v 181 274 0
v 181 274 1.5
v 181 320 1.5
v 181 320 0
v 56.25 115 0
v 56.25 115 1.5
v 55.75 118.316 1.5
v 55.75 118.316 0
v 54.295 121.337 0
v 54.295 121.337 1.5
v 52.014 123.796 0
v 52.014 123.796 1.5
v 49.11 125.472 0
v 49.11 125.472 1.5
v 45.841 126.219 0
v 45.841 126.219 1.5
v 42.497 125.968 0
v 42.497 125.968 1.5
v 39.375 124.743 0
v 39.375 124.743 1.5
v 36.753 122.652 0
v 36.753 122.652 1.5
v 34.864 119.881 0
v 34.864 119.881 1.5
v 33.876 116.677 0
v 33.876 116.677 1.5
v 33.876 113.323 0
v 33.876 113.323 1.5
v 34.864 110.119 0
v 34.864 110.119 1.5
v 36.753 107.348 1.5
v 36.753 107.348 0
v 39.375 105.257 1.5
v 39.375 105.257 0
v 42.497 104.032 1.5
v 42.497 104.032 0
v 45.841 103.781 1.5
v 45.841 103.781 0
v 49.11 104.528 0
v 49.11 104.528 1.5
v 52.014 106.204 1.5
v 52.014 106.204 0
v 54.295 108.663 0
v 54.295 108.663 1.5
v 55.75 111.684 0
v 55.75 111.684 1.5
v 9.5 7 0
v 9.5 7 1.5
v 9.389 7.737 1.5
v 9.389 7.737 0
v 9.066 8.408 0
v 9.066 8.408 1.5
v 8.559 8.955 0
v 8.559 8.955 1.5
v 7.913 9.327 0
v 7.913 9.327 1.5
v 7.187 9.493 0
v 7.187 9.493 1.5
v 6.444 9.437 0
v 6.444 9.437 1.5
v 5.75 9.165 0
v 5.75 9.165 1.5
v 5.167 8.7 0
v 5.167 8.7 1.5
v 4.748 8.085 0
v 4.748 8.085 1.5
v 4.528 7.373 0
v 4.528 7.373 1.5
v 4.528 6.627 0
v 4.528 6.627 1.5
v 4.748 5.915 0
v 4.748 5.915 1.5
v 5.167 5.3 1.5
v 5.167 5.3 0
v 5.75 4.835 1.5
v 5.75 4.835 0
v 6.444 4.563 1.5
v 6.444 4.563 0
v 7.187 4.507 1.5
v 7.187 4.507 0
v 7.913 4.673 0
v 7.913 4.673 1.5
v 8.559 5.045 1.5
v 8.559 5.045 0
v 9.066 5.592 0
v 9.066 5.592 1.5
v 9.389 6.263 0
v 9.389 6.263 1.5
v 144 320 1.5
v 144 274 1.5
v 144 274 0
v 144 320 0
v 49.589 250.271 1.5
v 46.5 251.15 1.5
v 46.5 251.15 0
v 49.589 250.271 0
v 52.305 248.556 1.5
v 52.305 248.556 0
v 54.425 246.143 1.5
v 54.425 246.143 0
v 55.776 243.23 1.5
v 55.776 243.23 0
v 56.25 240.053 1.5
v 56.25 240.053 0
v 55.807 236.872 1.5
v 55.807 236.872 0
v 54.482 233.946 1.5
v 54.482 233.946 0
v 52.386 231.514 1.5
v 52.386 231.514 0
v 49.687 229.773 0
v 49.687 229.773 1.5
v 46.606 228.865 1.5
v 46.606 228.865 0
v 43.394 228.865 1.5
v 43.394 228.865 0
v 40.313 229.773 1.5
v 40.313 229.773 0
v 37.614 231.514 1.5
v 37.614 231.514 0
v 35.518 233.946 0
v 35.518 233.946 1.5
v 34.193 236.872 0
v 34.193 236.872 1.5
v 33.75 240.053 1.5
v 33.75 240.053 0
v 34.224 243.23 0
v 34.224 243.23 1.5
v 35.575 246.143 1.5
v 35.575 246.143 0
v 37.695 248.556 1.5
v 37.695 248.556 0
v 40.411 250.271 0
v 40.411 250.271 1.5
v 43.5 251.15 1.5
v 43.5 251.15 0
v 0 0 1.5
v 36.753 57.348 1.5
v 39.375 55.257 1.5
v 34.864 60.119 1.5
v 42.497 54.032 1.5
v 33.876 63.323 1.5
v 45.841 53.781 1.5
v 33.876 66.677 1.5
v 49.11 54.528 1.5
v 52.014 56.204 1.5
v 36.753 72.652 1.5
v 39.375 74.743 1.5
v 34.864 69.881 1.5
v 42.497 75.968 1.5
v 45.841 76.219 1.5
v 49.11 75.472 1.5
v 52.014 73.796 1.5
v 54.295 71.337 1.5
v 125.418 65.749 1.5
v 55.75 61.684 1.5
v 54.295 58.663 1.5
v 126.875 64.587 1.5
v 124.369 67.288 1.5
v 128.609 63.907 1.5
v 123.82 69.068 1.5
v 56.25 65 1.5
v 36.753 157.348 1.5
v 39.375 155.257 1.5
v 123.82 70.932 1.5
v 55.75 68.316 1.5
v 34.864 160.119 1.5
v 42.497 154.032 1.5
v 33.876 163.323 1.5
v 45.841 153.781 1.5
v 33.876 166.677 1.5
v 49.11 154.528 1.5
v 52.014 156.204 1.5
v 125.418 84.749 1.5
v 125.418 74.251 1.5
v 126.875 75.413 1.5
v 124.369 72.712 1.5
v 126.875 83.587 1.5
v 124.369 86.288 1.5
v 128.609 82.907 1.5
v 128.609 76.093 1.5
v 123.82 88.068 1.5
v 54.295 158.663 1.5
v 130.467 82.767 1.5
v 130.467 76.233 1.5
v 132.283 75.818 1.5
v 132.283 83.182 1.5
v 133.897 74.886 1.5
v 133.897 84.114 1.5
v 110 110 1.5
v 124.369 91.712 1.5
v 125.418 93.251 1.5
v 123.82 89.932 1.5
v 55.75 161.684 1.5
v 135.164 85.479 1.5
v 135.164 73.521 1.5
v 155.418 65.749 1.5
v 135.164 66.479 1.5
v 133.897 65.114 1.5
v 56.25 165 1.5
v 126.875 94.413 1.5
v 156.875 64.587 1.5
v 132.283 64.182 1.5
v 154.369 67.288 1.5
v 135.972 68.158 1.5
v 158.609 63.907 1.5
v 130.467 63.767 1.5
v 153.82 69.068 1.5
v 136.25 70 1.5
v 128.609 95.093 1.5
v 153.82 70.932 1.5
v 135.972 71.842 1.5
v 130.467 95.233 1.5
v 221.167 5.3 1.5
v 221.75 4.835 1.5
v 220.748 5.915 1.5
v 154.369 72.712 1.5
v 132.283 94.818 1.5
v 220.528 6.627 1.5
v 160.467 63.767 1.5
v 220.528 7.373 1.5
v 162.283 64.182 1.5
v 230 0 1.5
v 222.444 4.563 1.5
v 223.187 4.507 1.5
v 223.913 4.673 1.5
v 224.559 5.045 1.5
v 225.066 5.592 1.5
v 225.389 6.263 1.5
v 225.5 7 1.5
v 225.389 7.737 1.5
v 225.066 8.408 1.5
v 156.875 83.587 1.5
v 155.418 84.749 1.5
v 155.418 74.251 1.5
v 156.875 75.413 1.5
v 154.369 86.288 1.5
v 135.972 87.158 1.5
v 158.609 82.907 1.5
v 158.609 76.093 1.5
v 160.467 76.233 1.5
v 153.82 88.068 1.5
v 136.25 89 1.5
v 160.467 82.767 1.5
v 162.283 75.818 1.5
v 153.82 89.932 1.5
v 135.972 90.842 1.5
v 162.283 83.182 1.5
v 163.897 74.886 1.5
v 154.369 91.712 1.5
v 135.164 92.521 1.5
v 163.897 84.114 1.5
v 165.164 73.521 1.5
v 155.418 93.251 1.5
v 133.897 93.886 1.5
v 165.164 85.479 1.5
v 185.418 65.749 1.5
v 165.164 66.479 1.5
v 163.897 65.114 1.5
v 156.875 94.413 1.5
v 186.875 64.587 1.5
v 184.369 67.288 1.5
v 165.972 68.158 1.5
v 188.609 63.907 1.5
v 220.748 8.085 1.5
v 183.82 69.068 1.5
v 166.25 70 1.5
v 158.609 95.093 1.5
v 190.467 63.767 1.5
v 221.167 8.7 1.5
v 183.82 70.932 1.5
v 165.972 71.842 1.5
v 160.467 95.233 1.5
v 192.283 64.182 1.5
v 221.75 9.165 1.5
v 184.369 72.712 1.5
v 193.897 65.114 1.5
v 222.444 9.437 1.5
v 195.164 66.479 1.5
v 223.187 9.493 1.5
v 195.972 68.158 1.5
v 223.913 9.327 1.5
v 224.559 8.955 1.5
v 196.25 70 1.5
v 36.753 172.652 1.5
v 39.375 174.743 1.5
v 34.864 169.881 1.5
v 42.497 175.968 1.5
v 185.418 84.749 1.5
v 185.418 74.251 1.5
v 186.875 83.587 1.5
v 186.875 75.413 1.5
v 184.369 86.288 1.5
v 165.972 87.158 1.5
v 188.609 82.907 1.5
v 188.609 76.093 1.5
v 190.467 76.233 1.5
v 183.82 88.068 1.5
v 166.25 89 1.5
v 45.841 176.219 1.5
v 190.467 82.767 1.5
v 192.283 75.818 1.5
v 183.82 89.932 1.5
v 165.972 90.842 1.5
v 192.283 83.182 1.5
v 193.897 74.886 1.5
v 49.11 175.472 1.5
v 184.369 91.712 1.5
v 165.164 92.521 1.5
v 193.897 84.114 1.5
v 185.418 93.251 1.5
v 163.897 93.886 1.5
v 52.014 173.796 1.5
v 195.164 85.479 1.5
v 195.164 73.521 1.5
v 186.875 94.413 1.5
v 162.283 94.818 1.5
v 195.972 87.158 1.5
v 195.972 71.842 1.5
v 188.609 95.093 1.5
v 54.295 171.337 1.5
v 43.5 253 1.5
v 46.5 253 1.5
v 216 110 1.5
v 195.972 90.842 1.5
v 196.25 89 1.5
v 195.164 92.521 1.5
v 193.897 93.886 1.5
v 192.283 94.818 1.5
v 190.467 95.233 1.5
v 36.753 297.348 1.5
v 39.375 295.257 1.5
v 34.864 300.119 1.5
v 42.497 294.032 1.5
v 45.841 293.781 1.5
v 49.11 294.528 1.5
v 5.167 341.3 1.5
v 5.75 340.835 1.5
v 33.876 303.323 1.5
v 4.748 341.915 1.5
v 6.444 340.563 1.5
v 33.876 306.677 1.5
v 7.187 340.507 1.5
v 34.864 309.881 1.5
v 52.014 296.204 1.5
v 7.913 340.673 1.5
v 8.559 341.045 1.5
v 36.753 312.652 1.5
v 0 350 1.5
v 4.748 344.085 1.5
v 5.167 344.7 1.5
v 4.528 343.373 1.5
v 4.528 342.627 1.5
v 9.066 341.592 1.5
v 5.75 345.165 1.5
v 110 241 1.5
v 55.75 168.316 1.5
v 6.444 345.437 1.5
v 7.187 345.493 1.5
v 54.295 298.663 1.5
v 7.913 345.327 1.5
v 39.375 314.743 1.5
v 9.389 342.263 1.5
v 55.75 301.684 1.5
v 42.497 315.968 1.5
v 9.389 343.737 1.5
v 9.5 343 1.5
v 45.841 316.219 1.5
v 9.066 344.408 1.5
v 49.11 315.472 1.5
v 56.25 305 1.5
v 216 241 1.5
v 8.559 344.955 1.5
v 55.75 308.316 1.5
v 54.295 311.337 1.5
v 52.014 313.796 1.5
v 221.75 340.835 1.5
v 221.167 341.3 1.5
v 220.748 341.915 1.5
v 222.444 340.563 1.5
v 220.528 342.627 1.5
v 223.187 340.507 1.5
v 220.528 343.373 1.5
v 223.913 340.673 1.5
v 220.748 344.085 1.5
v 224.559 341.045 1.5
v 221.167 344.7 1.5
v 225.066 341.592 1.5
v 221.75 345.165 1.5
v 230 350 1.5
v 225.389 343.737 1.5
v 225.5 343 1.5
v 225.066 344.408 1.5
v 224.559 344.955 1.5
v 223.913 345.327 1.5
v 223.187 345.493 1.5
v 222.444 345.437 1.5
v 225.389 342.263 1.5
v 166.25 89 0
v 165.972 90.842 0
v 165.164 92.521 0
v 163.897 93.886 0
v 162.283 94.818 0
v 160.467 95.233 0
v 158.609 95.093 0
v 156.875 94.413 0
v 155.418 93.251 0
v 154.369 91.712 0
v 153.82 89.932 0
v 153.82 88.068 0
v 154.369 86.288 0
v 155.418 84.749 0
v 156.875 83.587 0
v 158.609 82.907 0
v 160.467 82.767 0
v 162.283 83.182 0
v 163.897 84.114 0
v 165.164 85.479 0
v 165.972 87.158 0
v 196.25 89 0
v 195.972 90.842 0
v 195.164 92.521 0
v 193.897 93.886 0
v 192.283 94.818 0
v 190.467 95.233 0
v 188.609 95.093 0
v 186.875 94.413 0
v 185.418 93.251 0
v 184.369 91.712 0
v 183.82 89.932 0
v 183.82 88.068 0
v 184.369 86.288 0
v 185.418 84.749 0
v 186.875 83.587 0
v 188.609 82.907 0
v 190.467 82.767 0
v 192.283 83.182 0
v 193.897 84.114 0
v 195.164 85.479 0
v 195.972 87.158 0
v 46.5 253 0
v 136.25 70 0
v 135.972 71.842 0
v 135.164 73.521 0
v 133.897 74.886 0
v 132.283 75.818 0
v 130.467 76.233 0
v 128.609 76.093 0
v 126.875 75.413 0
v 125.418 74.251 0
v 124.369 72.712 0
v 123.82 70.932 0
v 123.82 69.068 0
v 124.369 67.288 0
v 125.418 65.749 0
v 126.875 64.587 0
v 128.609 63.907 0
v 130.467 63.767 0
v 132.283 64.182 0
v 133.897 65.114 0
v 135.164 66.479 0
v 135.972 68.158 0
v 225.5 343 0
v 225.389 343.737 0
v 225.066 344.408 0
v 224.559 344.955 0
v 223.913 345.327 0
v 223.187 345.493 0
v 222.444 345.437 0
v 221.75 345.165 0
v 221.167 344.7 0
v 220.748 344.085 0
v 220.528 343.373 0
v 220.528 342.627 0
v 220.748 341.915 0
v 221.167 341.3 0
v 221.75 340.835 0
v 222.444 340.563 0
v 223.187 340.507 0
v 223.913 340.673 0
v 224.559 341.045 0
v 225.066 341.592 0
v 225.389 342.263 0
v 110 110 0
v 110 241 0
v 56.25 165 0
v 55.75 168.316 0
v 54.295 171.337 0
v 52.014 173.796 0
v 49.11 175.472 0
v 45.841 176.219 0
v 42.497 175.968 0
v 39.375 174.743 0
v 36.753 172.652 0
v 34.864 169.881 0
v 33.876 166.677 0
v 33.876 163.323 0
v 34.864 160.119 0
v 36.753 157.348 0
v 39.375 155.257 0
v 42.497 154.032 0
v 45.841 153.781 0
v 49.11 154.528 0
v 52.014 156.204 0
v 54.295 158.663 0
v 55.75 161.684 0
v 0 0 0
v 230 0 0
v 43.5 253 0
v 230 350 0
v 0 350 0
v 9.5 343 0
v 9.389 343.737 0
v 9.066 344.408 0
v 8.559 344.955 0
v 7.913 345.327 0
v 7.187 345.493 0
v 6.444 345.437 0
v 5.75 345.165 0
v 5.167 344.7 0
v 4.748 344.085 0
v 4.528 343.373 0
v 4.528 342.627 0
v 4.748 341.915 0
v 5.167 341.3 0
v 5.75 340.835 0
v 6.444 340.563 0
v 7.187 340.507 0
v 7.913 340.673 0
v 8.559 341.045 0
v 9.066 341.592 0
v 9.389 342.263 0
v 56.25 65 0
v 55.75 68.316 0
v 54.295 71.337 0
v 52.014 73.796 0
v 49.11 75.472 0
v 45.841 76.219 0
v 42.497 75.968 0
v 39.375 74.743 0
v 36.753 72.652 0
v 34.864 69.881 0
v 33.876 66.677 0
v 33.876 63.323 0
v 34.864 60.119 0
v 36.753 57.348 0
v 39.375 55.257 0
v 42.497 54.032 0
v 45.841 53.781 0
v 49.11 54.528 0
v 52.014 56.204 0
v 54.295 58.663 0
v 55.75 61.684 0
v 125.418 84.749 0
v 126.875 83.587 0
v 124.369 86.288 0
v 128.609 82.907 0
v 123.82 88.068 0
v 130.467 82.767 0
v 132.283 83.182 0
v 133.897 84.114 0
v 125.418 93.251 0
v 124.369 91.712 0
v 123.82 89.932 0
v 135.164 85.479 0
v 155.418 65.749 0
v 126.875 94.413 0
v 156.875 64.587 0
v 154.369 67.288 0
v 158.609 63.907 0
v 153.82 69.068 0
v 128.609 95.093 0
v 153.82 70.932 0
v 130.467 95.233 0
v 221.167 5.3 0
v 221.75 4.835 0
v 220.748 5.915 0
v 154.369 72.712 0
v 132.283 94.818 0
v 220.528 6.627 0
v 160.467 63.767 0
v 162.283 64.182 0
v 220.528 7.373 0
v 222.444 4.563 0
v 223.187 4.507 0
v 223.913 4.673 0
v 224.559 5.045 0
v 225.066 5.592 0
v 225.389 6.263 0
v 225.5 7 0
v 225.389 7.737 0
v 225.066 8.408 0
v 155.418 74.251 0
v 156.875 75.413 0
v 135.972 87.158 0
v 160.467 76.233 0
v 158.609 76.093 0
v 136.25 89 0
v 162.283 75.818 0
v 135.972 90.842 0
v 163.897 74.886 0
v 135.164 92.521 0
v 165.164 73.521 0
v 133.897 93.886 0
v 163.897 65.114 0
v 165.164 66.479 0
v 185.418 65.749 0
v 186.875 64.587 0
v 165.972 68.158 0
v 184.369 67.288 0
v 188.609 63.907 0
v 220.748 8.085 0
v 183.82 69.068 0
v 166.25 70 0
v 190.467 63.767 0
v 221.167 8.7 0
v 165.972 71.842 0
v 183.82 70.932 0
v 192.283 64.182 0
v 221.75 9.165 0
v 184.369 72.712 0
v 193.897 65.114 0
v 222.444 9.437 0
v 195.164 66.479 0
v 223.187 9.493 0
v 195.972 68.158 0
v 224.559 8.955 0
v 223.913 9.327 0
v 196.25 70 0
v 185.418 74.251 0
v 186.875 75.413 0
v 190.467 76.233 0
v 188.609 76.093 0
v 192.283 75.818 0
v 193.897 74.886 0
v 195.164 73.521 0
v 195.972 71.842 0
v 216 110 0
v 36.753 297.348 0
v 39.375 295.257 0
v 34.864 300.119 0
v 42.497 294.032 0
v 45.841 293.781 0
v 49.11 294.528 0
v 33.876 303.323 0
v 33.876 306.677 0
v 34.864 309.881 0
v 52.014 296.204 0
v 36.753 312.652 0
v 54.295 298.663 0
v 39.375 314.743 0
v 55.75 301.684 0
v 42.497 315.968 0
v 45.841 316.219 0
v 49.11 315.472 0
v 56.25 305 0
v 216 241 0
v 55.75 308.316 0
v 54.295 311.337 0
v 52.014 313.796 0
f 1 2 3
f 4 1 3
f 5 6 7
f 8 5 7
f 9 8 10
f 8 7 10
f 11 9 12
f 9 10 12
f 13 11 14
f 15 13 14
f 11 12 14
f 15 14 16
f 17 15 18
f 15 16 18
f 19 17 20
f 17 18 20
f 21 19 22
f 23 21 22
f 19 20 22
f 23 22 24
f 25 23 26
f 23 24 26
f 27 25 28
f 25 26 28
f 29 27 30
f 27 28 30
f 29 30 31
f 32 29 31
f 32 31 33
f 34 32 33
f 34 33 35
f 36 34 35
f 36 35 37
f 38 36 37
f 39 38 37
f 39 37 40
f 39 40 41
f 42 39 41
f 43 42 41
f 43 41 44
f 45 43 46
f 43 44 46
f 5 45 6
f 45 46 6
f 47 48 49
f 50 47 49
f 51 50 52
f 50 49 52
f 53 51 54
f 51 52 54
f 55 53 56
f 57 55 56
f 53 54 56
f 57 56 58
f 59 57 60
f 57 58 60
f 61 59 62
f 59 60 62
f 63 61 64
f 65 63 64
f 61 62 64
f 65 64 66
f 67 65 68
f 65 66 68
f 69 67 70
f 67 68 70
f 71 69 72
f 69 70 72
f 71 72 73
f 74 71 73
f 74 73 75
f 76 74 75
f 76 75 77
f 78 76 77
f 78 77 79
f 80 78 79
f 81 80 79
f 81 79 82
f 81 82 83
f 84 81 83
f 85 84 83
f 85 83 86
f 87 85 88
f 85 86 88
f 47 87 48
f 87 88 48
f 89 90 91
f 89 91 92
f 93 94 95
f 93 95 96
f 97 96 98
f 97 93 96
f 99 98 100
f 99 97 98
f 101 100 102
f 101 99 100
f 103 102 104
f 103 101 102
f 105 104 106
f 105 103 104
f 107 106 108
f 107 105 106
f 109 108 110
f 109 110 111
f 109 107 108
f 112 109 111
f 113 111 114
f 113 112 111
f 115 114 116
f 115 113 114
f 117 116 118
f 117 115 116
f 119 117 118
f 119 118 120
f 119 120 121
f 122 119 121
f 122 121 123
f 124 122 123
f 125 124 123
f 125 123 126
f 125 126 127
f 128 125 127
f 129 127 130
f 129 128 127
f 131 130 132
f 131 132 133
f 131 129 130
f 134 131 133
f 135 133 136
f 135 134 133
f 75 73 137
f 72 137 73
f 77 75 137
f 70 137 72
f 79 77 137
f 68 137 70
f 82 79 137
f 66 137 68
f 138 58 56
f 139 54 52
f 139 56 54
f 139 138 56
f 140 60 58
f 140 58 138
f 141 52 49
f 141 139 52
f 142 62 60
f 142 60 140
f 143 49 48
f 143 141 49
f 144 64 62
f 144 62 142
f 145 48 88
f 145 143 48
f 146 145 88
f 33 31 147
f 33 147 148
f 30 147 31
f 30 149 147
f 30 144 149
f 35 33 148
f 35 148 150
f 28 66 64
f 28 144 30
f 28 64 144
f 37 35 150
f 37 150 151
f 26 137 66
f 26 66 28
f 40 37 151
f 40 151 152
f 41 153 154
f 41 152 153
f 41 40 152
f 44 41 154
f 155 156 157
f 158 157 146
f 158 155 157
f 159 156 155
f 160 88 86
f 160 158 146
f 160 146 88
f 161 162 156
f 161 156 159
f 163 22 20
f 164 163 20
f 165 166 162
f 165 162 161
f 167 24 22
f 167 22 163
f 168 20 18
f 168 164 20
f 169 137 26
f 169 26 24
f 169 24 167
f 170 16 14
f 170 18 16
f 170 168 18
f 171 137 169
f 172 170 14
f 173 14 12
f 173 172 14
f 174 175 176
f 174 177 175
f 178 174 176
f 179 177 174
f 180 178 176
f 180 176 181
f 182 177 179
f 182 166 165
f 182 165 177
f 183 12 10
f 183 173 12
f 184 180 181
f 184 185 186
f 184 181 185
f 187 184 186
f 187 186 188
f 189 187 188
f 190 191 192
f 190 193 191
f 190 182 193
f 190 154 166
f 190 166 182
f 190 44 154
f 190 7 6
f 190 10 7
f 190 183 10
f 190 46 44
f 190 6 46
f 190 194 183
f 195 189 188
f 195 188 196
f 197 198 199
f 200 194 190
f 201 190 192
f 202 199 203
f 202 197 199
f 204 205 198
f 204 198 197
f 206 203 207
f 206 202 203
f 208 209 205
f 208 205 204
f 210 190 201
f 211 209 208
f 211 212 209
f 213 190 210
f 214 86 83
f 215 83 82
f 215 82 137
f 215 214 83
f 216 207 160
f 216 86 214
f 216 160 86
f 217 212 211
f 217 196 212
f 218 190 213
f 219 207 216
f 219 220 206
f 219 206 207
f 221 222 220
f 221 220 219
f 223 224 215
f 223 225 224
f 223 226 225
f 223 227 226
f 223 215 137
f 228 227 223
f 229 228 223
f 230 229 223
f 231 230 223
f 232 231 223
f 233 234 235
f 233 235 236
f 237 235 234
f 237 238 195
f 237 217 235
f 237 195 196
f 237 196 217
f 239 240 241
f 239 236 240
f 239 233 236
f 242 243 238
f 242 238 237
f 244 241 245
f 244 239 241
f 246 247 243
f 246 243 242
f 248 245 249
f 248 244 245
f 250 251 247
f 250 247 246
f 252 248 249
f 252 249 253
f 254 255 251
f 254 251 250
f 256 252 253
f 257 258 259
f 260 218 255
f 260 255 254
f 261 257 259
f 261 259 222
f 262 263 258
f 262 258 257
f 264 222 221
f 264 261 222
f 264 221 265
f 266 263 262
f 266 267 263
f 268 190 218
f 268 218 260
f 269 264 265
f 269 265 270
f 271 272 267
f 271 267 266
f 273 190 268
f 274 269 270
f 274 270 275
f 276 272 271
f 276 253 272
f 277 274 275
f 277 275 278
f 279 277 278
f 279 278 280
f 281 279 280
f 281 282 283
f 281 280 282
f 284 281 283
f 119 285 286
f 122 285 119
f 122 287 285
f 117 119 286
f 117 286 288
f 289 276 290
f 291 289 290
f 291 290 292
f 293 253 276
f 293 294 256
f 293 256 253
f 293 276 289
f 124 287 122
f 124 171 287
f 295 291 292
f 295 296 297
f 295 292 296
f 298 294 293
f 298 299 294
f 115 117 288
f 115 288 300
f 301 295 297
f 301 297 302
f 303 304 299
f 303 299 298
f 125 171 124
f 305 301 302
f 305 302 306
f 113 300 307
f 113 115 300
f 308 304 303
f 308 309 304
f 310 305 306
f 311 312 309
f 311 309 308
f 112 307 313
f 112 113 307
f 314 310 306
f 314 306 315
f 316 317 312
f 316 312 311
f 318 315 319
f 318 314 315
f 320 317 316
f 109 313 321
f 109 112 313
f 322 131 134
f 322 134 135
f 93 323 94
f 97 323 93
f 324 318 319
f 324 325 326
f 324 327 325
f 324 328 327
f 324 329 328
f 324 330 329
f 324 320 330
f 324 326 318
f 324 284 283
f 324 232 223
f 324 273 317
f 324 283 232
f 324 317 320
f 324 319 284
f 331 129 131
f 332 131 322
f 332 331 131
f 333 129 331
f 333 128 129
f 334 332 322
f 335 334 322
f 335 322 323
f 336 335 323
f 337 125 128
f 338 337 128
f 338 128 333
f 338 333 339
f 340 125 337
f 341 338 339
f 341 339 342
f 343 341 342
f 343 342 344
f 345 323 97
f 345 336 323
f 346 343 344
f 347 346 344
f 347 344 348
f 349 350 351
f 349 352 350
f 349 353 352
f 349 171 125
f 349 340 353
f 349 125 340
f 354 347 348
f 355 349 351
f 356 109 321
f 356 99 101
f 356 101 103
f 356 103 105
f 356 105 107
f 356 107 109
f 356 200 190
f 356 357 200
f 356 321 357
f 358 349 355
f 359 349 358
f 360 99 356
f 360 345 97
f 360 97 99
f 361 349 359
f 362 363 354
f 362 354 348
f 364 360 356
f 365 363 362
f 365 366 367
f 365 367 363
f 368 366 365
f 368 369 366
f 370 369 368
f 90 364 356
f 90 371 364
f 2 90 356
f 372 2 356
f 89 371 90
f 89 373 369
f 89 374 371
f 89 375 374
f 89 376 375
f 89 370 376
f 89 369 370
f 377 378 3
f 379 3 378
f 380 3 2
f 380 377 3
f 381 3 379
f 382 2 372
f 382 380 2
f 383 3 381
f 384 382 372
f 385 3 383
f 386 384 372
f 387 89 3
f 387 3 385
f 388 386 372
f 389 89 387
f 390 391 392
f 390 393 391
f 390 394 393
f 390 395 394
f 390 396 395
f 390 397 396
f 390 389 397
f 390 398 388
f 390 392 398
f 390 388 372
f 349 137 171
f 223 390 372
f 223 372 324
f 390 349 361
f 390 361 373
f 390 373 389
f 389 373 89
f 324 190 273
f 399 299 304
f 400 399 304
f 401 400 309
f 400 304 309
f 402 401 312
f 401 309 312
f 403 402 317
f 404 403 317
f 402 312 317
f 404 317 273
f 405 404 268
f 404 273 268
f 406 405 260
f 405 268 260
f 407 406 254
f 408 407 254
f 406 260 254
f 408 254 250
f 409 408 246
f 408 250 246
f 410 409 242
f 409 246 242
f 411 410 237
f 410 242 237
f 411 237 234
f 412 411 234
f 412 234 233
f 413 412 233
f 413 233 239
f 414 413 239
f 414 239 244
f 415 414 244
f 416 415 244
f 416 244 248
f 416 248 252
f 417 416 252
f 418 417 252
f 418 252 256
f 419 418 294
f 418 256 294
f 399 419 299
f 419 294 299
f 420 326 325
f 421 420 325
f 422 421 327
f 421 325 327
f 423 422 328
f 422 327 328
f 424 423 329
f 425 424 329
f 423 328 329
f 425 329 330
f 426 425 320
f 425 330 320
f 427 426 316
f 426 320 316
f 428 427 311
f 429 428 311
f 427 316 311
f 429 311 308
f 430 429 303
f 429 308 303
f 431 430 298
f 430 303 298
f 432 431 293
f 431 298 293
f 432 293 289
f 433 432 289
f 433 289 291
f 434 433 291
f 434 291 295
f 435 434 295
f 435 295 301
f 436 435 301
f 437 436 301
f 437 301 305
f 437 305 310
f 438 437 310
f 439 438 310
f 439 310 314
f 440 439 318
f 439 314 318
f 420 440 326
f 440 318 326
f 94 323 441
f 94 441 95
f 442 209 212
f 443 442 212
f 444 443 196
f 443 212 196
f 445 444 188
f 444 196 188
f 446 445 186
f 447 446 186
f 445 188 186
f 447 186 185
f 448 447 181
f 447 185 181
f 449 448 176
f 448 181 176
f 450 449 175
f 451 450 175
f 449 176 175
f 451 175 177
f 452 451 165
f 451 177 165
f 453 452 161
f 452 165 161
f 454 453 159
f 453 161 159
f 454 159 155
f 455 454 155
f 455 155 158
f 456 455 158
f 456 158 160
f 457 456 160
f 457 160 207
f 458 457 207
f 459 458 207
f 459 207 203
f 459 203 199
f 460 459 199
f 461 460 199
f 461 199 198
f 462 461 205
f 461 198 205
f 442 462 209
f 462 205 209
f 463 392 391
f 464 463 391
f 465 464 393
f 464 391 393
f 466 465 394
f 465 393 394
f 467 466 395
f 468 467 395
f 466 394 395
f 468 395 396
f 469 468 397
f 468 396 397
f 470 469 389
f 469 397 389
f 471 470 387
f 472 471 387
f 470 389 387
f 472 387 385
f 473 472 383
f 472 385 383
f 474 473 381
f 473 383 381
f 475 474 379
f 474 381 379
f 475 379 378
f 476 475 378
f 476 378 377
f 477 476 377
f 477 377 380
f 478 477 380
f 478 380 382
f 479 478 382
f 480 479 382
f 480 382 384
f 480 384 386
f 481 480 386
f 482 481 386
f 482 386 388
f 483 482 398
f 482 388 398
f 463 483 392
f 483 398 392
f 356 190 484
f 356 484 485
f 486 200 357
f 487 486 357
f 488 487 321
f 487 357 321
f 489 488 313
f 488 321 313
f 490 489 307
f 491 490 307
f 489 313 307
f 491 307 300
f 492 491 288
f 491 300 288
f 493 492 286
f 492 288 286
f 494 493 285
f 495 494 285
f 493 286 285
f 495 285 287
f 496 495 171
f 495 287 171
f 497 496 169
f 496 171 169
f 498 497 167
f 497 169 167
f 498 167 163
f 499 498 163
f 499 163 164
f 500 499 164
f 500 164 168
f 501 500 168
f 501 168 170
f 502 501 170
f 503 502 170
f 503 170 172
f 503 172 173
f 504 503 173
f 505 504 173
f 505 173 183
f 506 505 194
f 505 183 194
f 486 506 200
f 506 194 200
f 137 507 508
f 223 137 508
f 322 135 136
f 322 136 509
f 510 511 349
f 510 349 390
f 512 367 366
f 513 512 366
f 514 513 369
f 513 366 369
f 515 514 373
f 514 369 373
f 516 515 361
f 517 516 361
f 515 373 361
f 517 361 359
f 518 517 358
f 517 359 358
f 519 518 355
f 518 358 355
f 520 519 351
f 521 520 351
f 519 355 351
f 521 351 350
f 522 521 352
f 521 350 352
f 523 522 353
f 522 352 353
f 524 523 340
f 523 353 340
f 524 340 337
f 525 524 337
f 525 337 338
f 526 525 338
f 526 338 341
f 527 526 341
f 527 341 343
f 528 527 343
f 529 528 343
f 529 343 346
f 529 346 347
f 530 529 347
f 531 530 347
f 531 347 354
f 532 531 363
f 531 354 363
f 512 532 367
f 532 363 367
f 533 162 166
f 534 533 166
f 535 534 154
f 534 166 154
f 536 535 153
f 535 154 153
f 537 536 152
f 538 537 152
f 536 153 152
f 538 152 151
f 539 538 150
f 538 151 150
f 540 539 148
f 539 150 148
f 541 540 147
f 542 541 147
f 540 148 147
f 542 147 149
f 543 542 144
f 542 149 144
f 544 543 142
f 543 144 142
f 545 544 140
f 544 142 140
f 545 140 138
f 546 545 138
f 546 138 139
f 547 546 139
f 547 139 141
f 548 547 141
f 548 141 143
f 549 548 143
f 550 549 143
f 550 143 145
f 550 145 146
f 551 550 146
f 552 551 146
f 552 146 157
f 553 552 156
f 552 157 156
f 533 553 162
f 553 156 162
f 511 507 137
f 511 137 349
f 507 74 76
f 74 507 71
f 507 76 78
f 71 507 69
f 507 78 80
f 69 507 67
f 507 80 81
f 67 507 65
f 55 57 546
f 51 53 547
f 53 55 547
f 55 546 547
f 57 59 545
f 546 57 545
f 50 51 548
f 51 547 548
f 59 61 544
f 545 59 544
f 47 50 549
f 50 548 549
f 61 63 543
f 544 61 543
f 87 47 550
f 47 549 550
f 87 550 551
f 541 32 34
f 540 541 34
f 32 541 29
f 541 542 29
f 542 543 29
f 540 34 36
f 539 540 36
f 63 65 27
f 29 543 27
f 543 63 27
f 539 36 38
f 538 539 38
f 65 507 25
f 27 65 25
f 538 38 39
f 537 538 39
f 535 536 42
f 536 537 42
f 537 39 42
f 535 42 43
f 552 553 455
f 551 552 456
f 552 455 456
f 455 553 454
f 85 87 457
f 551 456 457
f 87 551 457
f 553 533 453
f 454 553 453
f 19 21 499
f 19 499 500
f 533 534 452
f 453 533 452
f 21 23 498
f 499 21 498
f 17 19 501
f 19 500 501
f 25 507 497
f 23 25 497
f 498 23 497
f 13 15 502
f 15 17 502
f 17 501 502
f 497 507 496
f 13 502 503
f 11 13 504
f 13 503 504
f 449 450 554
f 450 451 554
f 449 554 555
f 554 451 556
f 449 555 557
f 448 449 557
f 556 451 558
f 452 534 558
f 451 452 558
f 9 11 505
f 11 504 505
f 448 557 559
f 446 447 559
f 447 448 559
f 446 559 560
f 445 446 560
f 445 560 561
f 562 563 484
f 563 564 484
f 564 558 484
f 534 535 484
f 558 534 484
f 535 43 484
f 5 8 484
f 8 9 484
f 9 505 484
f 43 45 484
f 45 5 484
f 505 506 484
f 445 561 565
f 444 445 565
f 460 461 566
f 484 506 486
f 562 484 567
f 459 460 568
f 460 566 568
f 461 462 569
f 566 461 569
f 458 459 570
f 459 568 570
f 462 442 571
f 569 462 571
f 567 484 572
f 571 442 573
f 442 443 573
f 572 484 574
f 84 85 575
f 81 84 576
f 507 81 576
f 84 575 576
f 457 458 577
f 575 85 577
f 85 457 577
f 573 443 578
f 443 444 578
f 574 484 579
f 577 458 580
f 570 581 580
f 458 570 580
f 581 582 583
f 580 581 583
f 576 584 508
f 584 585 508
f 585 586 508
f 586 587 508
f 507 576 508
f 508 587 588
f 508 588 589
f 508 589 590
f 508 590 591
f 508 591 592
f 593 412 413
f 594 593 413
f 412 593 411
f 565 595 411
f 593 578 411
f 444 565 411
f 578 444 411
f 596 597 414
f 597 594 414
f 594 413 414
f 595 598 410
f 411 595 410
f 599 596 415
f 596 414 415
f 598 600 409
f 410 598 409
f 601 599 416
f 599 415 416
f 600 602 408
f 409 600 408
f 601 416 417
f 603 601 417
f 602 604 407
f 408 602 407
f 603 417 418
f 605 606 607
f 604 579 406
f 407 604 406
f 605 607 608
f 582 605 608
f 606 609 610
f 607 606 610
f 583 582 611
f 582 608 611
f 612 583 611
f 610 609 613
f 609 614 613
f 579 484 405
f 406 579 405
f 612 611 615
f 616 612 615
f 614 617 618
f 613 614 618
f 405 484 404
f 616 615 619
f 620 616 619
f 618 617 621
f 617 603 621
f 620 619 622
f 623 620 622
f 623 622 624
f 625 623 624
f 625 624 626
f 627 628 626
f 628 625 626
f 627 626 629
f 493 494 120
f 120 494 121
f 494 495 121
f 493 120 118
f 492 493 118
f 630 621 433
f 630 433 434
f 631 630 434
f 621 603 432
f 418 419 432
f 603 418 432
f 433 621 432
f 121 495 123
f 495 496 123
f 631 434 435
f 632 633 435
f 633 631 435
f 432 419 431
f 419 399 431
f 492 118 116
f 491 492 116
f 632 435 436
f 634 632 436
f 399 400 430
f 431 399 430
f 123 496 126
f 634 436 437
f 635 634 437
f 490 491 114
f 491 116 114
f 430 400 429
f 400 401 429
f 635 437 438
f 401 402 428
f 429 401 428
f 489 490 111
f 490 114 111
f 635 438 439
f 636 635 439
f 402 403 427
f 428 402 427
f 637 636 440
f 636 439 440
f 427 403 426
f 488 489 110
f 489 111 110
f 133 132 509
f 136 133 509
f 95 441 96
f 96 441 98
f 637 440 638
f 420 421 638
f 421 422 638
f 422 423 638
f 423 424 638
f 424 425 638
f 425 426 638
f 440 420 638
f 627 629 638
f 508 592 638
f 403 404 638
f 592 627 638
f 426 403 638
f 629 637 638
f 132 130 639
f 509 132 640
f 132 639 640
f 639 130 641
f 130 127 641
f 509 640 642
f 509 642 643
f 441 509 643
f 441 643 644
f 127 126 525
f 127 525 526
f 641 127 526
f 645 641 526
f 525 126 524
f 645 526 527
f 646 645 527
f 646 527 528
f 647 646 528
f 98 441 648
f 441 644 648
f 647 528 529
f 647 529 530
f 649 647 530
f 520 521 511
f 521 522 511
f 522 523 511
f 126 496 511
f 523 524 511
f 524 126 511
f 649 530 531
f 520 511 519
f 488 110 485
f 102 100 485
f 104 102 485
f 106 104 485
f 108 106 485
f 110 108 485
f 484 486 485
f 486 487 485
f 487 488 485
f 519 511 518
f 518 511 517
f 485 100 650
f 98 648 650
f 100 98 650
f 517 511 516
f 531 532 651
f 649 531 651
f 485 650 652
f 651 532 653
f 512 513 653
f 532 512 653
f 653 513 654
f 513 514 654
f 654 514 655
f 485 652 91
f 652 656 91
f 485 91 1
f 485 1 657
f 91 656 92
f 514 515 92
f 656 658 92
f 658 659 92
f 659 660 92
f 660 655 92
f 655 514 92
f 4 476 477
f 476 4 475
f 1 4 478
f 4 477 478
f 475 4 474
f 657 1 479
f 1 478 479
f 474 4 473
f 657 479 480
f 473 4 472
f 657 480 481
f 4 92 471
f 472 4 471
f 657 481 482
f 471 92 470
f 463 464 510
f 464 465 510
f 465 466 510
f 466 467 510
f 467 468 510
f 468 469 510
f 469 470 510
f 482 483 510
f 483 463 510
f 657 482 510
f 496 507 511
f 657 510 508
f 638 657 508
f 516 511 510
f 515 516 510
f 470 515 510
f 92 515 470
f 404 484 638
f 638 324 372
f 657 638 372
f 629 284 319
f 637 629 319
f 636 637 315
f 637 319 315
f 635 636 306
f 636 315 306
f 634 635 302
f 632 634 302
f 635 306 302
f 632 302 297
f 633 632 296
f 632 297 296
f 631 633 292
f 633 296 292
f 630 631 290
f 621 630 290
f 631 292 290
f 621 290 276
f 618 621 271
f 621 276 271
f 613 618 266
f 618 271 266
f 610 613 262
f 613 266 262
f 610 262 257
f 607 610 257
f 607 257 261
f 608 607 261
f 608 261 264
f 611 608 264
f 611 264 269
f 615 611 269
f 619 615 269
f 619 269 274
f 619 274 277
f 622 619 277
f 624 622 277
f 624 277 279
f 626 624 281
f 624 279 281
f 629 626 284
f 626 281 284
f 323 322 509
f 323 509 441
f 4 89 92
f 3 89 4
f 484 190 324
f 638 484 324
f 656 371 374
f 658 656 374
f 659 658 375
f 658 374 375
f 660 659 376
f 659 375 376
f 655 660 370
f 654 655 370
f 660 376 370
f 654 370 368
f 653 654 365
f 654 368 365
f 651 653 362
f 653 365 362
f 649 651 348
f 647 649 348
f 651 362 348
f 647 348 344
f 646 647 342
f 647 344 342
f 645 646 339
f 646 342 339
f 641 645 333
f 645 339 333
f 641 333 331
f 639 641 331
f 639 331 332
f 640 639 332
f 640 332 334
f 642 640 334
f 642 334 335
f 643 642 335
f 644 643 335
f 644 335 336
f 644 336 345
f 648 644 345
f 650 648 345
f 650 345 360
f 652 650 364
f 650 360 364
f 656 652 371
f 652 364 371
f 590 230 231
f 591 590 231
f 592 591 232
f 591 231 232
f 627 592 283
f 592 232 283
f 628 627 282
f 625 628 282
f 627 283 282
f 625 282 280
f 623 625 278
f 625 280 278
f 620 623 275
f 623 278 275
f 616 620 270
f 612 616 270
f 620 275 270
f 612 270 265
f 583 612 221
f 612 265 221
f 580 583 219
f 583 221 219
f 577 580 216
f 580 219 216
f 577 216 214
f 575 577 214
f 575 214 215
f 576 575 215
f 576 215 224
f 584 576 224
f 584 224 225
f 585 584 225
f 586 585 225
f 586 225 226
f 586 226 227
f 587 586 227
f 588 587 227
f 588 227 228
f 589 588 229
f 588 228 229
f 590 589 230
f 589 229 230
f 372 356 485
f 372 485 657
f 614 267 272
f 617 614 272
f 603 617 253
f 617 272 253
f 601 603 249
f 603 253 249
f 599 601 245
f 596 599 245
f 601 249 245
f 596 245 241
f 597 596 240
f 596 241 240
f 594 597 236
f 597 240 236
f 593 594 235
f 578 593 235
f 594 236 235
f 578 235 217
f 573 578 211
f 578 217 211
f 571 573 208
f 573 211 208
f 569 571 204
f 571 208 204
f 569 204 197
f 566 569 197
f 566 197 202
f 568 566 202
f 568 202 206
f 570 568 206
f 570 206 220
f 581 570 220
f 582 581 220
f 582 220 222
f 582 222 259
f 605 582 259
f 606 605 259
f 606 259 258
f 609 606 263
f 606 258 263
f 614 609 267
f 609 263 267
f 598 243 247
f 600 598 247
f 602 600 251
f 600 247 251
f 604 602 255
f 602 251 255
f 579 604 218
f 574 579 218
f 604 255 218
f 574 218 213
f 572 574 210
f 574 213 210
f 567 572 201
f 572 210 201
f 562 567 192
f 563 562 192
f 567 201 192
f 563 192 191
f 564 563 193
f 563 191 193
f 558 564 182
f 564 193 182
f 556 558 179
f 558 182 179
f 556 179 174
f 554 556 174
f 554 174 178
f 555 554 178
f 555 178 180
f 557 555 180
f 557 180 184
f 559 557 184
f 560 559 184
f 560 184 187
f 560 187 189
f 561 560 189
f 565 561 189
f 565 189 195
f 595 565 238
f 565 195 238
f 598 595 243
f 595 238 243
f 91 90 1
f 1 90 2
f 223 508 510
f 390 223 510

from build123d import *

# Parameters (mm, degrees)
ESQUISSE1_W             = 230
ESQUISSE1_H             = 350
BASE_EXTRUSION_DEPTH    = 1.5
ESQUISSE2_R             = 2.5
ENL_V_MAT_EXTRU_1_DEPTH = 1.5
ESQUISSE3_R             = 11.25
ENL_V_MAT_EXTRU_2_DEPTH = 1.5
ESQUISSE4_R             = 6.25
ENL_V_MAT_EXTRU_3_DEPTH = 1.5
ESQUISSE5_W             = 106
ESQUISSE5_H             = 131
ENL_V_MAT_EXTRU_4_DEPTH = 1.5
ESQUISSE6_W             = 37
ESQUISSE6_H             = 46
ENL_V_MAT_EXTRU_5_DEPTH = 1.5


with BuildPart() as part:
    # Esquisse1 → Base-Extrusion (new body)
    with BuildSketch(Plane.XY):
        with Locations((115, 175)):
            Rectangle(ESQUISSE1_W, ESQUISSE1_H)
    extrude(amount=BASE_EXTRUSION_DEPTH)

    # Esquisse2 → Enlèv. mat.-Extru.1 (cut)
    with BuildSketch(Plane.XY.offset(1.5)):
        with Locations((7, 7)):
            Circle(ESQUISSE2_R)
        with Locations((223, 7)):
            Circle(ESQUISSE2_R)
        with Locations((7, 343)):
            Circle(ESQUISSE2_R)
        with Locations((223, 343)):
            Circle(ESQUISSE2_R)
    extrude(amount=-ENL_V_MAT_EXTRU_1_DEPTH, mode=Mode.SUBTRACT)

    # Esquisse3 → Enlèv. mat.-Extru.2 (cut)
    with BuildSketch(Plane.XY.offset(1.5)):
        with Locations((45, 65)):
            Circle(ESQUISSE3_R)
        with Locations((45, 115)):
            Circle(ESQUISSE3_R)
        with Locations((45, 165)):
            Circle(ESQUISSE3_R)
        with Locations((45, 305)):
            Circle(ESQUISSE3_R)
        with BuildLine():
            Line((43.5, 251.14955156), (43.5, 253))
            Line((43.5, 253), (46.5, 253))
            Line((46.5, 253), (46.5, 251.14955156))
            ThreePointArc((46.5, 251.14955156), (45, 228.75), (43.5, 251.14955156))
        make_face()
    extrude(amount=-ENL_V_MAT_EXTRU_2_DEPTH, mode=Mode.SUBTRACT)

    # Esquisse4 → Enlèv. mat.-Extru.3 (cut)
    with BuildSketch(Plane.XY.offset(1.5)):
        with Locations((130, 70)):
            Circle(ESQUISSE4_R)
        with Locations((130, 89)):
            Circle(ESQUISSE4_R)
        with Locations((160, 70)):
            Circle(ESQUISSE4_R)
        with Locations((160, 89)):
            Circle(ESQUISSE4_R)
        with Locations((190, 70)):
            Circle(ESQUISSE4_R)
        with Locations((190, 89)):
            Circle(ESQUISSE4_R)
    extrude(amount=-ENL_V_MAT_EXTRU_3_DEPTH, mode=Mode.SUBTRACT)

    # Esquisse5 → Enlèv. mat.-Extru.4 (cut)
    with BuildSketch(Plane.XY.offset(1.5)):
        with Locations((163, 175.5)):
            Rectangle(ESQUISSE5_W, ESQUISSE5_H)
    extrude(amount=-ENL_V_MAT_EXTRU_4_DEPTH, mode=Mode.SUBTRACT)

    # Esquisse6 → Enlèv. mat.-Extru.5 (cut)
    with BuildSketch(Plane.XY.offset(1.5)):
        with Locations((162.5, 297)):
            Rectangle(ESQUISSE6_W, ESQUISSE6_H)
    extrude(amount=-ENL_V_MAT_EXTRU_5_DEPTH, mode=Mode.SUBTRACT)


solid = part.part
